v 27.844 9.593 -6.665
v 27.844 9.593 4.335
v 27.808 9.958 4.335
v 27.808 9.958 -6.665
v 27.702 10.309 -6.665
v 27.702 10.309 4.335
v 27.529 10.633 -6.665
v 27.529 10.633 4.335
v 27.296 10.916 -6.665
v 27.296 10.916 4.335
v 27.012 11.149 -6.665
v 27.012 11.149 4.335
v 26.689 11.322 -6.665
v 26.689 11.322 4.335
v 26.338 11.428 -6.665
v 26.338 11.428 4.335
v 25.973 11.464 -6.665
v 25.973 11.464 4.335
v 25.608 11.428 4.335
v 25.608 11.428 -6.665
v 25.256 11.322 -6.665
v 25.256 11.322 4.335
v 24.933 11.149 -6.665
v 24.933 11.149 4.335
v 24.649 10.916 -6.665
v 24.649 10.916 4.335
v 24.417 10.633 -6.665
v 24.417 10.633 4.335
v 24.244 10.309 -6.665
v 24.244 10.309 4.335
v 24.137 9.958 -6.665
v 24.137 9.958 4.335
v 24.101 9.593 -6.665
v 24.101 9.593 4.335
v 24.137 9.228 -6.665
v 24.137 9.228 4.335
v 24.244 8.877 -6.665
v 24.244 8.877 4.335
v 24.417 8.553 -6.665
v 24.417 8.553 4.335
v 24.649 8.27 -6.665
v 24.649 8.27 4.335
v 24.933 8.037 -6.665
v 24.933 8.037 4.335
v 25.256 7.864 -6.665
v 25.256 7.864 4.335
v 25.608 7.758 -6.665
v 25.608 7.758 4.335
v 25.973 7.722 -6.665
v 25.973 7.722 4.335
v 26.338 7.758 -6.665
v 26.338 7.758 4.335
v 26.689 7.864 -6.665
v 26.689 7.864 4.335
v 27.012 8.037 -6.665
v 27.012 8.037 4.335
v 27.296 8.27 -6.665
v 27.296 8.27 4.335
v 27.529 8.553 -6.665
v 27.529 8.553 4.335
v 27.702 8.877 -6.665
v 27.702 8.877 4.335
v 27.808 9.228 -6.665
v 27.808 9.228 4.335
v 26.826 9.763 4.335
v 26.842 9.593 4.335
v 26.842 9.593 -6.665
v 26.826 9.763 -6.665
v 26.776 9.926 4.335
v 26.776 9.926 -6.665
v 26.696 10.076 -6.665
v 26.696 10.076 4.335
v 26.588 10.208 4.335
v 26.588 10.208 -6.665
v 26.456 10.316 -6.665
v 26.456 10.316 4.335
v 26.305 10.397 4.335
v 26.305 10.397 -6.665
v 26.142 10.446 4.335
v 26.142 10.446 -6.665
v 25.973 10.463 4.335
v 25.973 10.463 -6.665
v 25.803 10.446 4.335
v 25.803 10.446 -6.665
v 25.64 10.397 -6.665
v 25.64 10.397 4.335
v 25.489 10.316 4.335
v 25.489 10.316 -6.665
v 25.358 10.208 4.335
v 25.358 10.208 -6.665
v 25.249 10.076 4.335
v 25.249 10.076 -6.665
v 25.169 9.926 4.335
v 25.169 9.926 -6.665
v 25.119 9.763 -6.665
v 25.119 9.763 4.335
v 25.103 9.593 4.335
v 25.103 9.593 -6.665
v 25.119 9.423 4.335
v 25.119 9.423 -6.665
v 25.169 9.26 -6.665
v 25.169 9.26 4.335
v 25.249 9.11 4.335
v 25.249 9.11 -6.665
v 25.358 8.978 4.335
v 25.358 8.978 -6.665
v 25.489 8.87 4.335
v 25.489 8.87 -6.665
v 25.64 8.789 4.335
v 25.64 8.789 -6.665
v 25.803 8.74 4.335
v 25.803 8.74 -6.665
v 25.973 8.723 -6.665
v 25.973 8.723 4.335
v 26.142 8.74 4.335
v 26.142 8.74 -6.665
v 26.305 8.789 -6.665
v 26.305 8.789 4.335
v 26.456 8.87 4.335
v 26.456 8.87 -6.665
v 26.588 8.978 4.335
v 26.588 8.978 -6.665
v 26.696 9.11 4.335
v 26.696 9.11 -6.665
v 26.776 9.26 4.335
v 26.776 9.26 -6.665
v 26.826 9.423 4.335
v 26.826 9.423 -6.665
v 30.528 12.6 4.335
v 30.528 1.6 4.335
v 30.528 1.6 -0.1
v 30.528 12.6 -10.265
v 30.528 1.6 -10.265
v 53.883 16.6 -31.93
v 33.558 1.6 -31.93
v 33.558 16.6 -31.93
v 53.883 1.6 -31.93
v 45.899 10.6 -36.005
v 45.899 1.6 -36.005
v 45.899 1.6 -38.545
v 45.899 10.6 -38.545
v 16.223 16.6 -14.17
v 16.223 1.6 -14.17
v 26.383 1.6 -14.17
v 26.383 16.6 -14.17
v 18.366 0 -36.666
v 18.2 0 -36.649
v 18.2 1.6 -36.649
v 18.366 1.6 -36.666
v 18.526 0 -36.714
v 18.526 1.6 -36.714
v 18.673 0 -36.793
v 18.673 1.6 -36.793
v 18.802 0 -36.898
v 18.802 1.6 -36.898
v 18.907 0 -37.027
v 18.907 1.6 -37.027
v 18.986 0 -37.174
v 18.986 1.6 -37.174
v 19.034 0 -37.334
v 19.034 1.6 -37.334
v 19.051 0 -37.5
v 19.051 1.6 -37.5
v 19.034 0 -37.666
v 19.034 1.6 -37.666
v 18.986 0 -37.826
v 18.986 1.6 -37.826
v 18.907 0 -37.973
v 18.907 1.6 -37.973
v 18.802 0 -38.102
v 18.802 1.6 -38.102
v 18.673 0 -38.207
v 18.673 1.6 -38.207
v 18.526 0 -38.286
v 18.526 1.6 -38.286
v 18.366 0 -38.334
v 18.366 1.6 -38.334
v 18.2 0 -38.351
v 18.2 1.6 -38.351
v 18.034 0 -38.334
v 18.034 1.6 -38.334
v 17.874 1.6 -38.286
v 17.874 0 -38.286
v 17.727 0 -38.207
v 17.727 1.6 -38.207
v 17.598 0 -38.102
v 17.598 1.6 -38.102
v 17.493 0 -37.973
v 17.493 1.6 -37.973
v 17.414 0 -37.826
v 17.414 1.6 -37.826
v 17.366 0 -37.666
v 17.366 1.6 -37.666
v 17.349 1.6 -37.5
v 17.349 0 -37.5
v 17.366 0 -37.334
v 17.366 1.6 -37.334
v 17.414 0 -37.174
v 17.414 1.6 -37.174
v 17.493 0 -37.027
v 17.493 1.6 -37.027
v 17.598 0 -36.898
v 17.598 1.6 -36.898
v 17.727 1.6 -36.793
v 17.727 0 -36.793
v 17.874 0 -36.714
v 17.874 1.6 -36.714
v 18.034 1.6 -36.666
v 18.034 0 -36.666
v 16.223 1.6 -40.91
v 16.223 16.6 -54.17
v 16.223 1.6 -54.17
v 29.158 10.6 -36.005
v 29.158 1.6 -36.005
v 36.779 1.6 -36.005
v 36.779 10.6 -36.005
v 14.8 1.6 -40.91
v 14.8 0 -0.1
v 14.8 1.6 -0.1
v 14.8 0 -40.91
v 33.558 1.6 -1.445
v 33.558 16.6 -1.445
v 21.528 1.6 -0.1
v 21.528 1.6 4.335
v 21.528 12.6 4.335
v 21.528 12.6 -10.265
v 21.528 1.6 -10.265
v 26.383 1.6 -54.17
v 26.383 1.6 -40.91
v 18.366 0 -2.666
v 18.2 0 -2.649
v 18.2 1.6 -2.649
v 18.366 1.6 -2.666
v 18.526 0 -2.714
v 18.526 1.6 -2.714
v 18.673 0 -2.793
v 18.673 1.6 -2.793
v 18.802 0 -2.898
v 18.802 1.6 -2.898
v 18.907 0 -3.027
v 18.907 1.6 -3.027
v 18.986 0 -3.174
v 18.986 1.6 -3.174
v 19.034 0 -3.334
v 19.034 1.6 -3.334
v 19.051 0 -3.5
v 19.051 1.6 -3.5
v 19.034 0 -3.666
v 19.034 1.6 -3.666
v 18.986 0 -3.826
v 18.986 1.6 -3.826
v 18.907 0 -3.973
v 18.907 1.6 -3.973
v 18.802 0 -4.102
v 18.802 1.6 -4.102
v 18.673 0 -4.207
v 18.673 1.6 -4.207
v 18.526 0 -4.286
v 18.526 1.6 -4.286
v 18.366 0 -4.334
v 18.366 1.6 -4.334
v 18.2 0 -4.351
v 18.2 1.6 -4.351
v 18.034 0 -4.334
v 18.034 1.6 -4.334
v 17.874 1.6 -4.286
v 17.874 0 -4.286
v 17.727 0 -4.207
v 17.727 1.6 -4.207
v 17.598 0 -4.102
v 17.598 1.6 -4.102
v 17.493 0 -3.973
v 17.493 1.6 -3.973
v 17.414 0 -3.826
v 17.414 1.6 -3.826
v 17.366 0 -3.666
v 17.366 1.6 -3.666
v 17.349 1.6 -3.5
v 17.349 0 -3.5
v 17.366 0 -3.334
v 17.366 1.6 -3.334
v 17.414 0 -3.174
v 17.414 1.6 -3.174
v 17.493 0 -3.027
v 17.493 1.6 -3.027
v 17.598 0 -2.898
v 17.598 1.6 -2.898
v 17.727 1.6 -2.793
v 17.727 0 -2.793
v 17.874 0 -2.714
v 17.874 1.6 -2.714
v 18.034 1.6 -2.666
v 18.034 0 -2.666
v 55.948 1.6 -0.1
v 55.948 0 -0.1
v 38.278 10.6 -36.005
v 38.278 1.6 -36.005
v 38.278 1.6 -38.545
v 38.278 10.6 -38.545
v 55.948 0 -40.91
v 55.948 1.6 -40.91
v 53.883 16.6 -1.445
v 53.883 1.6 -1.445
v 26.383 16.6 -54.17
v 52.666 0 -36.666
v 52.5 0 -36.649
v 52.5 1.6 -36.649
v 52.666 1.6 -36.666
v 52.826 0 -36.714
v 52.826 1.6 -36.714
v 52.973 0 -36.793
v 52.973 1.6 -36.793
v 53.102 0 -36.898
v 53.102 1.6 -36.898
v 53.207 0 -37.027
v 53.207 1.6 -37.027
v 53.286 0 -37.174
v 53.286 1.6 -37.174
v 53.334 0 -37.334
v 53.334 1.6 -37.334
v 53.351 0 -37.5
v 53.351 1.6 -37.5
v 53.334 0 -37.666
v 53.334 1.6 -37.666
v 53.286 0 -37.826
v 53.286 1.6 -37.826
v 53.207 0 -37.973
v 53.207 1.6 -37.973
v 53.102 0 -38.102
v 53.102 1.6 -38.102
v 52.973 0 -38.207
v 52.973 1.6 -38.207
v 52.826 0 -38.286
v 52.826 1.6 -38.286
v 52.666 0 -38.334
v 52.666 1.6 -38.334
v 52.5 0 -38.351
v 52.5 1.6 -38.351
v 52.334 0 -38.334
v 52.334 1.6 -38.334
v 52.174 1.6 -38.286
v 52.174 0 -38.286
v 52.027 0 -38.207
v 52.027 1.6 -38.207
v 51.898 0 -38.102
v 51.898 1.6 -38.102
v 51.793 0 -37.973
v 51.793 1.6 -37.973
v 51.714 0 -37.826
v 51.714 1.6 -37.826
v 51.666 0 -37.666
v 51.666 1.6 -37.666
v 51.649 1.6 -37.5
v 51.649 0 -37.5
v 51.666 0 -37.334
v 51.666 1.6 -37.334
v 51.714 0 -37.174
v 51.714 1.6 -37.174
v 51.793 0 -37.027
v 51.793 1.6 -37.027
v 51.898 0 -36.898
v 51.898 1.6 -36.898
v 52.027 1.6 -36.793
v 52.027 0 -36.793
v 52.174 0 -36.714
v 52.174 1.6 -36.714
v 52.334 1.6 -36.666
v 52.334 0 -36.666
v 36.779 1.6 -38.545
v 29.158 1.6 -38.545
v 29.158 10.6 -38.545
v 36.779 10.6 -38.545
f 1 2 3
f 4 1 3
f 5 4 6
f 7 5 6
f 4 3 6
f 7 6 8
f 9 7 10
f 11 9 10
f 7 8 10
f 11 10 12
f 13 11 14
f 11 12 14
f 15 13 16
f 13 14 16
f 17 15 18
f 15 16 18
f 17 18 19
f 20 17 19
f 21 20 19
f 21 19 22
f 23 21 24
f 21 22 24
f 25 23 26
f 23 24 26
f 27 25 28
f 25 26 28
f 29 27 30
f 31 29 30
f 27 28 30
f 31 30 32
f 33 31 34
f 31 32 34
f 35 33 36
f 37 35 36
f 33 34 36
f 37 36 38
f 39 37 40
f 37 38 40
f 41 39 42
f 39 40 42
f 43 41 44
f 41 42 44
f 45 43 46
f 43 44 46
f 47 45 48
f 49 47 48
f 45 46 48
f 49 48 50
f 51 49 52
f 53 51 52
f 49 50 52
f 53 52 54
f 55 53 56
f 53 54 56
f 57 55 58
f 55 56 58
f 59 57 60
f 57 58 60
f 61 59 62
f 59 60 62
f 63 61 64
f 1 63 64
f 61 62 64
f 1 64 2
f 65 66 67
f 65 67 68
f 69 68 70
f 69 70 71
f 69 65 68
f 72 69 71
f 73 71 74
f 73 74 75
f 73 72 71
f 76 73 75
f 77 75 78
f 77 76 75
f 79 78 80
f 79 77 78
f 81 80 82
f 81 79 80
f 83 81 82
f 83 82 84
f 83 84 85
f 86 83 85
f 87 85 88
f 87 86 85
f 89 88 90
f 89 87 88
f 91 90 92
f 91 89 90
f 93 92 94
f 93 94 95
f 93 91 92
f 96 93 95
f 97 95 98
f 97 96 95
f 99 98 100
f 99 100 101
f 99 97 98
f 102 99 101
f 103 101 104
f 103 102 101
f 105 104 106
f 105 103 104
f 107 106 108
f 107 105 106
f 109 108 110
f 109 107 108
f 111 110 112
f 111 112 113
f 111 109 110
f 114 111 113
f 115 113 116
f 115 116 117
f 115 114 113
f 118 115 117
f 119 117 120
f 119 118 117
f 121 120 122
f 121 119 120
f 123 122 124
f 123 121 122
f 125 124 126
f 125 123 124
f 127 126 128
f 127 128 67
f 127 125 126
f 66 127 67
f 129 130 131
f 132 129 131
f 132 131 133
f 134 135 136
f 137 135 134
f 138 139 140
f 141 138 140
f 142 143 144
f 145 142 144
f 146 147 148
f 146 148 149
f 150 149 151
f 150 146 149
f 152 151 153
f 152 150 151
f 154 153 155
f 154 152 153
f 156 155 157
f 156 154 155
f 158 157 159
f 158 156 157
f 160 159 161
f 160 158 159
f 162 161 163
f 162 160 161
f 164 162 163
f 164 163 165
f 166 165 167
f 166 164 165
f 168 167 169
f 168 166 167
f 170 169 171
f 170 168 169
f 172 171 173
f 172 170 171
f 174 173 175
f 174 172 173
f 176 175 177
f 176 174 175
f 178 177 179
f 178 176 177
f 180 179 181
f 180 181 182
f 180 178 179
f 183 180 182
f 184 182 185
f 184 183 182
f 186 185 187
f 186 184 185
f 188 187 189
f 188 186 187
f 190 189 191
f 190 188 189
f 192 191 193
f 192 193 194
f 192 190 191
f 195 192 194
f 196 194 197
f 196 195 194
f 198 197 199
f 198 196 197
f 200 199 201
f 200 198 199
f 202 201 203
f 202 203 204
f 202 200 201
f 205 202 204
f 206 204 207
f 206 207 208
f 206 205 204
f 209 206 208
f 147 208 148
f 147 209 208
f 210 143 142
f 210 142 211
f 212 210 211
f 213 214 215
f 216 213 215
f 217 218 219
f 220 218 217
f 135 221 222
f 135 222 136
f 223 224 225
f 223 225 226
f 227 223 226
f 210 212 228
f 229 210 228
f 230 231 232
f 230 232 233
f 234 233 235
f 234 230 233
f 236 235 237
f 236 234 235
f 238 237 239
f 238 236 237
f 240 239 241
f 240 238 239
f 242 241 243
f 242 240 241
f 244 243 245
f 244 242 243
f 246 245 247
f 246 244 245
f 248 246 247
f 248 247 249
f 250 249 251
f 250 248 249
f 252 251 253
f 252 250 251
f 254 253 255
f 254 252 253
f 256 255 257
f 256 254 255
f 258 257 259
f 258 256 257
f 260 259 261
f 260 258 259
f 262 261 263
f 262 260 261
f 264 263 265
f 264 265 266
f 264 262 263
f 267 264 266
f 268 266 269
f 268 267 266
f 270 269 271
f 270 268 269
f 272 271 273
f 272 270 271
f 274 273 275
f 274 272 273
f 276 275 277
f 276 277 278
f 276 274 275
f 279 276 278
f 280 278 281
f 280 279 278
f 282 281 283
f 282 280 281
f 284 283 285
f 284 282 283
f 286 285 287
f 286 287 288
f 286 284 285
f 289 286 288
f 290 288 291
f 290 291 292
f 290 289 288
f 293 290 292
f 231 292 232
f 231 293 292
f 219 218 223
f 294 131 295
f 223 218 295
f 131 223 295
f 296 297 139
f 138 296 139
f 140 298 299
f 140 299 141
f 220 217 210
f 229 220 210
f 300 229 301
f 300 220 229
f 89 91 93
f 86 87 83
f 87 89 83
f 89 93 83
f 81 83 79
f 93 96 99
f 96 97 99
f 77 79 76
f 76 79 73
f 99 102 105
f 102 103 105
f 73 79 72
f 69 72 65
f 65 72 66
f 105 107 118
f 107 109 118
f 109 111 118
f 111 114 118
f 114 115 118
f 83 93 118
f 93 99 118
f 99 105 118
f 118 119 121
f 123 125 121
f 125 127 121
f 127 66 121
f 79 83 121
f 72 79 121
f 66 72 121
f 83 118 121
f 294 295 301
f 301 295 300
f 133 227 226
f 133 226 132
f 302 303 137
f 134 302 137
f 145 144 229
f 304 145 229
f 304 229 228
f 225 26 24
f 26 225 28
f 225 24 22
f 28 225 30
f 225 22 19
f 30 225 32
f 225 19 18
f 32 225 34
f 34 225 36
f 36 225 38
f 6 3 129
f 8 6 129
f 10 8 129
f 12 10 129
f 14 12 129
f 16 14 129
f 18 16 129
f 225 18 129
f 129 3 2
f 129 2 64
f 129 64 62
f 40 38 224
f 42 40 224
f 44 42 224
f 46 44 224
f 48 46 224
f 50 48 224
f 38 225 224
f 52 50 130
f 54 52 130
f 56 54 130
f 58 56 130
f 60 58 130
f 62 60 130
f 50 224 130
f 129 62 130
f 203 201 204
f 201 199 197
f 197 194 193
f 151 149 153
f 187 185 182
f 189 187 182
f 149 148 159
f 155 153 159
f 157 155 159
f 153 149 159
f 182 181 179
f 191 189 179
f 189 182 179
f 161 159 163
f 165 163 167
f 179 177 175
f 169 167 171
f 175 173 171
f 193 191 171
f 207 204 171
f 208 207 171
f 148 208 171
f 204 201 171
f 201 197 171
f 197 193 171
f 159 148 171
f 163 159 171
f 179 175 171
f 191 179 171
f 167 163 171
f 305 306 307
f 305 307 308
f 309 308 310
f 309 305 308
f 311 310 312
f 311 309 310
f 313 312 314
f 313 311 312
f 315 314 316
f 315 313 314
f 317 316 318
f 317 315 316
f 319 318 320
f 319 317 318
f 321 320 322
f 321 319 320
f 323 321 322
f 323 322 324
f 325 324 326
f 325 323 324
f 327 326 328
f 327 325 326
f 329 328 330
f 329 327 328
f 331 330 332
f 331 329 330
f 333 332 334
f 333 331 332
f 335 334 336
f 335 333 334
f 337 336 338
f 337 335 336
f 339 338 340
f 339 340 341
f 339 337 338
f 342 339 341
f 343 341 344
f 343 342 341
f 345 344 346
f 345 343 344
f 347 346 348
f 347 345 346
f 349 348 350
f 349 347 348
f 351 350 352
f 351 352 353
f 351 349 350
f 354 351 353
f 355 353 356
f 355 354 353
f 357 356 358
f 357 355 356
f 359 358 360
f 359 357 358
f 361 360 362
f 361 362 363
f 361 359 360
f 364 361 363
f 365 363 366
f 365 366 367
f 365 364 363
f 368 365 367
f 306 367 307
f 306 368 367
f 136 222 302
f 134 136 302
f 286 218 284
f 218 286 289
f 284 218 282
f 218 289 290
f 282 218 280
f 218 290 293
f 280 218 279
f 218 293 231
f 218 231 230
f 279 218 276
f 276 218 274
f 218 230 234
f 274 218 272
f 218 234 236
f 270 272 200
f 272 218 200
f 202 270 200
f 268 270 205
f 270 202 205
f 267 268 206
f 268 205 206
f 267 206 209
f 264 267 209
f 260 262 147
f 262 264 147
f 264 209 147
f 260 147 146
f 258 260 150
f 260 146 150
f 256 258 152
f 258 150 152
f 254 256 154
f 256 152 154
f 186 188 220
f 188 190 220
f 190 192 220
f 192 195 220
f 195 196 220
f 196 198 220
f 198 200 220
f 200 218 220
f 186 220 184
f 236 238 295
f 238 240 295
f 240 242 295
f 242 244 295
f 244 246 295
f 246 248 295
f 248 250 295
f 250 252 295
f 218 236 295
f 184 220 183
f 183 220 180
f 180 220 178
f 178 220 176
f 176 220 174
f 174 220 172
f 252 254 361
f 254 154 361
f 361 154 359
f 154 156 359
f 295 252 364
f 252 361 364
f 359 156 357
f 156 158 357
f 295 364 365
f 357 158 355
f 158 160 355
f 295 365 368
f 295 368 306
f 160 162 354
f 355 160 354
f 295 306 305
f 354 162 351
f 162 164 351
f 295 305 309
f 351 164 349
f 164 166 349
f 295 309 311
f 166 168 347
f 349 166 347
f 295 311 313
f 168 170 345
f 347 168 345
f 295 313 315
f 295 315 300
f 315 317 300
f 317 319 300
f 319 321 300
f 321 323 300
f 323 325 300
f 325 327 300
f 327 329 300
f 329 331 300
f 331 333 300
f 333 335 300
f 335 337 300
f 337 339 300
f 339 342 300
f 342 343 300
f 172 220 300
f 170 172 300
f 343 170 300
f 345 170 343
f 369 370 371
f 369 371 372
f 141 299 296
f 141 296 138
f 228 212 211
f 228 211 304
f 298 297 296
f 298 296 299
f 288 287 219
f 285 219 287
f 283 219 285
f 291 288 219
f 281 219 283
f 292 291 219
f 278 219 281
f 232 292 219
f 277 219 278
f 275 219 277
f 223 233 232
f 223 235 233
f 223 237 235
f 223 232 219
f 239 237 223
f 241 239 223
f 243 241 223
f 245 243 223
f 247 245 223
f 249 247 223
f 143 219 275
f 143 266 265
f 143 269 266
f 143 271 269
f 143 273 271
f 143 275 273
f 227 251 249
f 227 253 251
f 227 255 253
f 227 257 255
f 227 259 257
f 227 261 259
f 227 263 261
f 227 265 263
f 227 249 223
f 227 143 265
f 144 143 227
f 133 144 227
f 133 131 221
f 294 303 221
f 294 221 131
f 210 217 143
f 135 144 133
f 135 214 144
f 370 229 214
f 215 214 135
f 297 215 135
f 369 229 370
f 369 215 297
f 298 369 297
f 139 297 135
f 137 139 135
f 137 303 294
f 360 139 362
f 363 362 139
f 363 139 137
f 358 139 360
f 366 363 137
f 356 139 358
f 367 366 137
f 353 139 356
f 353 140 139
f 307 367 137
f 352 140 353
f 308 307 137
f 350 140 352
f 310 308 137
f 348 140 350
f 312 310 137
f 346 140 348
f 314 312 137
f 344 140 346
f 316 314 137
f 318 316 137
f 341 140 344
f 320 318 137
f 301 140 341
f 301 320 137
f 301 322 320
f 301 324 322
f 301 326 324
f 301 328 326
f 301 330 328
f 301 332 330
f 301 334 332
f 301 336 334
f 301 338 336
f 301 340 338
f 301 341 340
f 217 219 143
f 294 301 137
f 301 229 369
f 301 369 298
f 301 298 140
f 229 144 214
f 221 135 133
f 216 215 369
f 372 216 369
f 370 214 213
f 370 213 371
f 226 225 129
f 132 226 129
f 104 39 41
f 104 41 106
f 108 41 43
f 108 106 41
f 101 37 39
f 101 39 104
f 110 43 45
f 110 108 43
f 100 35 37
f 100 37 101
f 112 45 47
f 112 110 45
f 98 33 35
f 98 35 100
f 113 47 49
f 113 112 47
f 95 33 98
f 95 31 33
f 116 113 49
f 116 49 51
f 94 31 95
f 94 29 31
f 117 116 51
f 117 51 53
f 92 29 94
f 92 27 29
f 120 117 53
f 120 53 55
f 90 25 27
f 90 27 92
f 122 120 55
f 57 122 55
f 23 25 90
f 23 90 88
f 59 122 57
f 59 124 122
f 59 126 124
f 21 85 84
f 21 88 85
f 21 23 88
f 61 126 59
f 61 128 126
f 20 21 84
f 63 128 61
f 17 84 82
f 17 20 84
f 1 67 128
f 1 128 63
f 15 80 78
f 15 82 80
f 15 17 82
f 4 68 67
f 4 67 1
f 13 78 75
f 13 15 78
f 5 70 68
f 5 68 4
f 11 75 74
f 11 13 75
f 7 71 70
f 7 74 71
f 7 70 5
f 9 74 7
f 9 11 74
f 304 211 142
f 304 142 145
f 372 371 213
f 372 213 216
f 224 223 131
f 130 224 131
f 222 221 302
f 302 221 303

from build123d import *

# Parameters (mm, degrees)
SKETCH3_W           = 41.148121512
SKETCH3_H           = 40.81
SKETCH3_R           = 0.8508
BOSS_EXTRUDE1_DEPTH = 1.6
SKETCH4_W           = 9
SKETCH4_H           = 14.6
BOSS_EXTRUDE2_DEPTH = 11
SKETCH5_R           = 1.871357829
SKETCH5_R_2         = 0.869870556
CUT_EXTRUDE1_DEPTH  = 11
SKETCH6_W           = 20.324920815
SKETCH6_H           = 30.484920815
BOSS_EXTRUDE3_DEPTH = 15
SKETCH7_W           = 7.620985393
SKETCH7_H           = 2.54
SKETCH7_W_2         = 7.620835906
BOSS_EXTRUDE4_DEPTH = 9
SKETCH8_W           = 10.16
SKETCH8_H           = 40
BOSS_EXTRUDE5_DEPTH = 15


with BuildPart() as part:
    # Sketch3 → Boss-Extrude1 (new body)
    with BuildSketch(Plane(origin=(0, 0, 0), x_dir=(1, 0, 0), z_dir=(0, 1, 0))):
        with Locations((35.374060756, 20.505)):
            Rectangle(SKETCH3_W, SKETCH3_H)
        with Locations((18.2, 3.5)):
            Circle(SKETCH3_R, mode=Mode.SUBTRACT)
        with Locations((52.5, 37.5)):
            Circle(SKETCH3_R, mode=Mode.SUBTRACT)
        with Locations((18.2, 37.5)):
            Circle(SKETCH3_R, mode=Mode.SUBTRACT)
    extrude(amount=BOSS_EXTRUDE1_DEPTH)

    # Sketch4 → Boss-Extrude2 (add)
    with BuildSketch(Plane(origin=(0, 1.6, 0), x_dir=(1, 0, 0), z_dir=(0, 1, 0))):
        with Locations((26.028, 2.965)):
            Rectangle(SKETCH4_W, SKETCH4_H)
    extrude(amount=BOSS_EXTRUDE2_DEPTH)

    # Sketch5 → Cut-Extrude1 (cut)
    with BuildSketch(Plane.XY.offset(4.335)):
        with Locations((25.972613511, 9.593081392)):
            Circle(SKETCH5_R)
        with Locations((25.972613511, 9.593081392)):
            Circle(SKETCH5_R_2, mode=Mode.SUBTRACT)
    extrude(amount=-CUT_EXTRUDE1_DEPTH, mode=Mode.SUBTRACT)

    # Sketch6 → Boss-Extrude3 (add)
    with BuildSketch(Plane(origin=(0, 1.6, 0), x_dir=(1, 0, 0), z_dir=(0, 1, 0))):
        with Locations((43.720460407, 16.687539593)):
            Rectangle(SKETCH6_W, SKETCH6_H)
    extrude(amount=BOSS_EXTRUDE3_DEPTH)

    # Sketch7 → Boss-Extrude4 (add)
    with BuildSketch(Plane(origin=(0, 1.6, 0), x_dir=(1, 0, 0), z_dir=(0, 1, 0))):
        with Locations((32.968492697, 37.275)):
            Rectangle(SKETCH7_W, SKETCH7_H)
        with Locations((42.088417953, 37.275)):
            Rectangle(SKETCH7_W_2, SKETCH7_H)
    extrude(amount=BOSS_EXTRUDE4_DEPTH)

    # Sketch8 → Boss-Extrude5 (add)
    with BuildSketch(Plane(origin=(0, 1.6, 0), x_dir=(1, 0, 0), z_dir=(0, 1, 0))):
        with Locations((21.303, 34.17)):
            Rectangle(SKETCH8_W, SKETCH8_H)
    extrude(amount=BOSS_EXTRUDE5_DEPTH)


solid = part.part
